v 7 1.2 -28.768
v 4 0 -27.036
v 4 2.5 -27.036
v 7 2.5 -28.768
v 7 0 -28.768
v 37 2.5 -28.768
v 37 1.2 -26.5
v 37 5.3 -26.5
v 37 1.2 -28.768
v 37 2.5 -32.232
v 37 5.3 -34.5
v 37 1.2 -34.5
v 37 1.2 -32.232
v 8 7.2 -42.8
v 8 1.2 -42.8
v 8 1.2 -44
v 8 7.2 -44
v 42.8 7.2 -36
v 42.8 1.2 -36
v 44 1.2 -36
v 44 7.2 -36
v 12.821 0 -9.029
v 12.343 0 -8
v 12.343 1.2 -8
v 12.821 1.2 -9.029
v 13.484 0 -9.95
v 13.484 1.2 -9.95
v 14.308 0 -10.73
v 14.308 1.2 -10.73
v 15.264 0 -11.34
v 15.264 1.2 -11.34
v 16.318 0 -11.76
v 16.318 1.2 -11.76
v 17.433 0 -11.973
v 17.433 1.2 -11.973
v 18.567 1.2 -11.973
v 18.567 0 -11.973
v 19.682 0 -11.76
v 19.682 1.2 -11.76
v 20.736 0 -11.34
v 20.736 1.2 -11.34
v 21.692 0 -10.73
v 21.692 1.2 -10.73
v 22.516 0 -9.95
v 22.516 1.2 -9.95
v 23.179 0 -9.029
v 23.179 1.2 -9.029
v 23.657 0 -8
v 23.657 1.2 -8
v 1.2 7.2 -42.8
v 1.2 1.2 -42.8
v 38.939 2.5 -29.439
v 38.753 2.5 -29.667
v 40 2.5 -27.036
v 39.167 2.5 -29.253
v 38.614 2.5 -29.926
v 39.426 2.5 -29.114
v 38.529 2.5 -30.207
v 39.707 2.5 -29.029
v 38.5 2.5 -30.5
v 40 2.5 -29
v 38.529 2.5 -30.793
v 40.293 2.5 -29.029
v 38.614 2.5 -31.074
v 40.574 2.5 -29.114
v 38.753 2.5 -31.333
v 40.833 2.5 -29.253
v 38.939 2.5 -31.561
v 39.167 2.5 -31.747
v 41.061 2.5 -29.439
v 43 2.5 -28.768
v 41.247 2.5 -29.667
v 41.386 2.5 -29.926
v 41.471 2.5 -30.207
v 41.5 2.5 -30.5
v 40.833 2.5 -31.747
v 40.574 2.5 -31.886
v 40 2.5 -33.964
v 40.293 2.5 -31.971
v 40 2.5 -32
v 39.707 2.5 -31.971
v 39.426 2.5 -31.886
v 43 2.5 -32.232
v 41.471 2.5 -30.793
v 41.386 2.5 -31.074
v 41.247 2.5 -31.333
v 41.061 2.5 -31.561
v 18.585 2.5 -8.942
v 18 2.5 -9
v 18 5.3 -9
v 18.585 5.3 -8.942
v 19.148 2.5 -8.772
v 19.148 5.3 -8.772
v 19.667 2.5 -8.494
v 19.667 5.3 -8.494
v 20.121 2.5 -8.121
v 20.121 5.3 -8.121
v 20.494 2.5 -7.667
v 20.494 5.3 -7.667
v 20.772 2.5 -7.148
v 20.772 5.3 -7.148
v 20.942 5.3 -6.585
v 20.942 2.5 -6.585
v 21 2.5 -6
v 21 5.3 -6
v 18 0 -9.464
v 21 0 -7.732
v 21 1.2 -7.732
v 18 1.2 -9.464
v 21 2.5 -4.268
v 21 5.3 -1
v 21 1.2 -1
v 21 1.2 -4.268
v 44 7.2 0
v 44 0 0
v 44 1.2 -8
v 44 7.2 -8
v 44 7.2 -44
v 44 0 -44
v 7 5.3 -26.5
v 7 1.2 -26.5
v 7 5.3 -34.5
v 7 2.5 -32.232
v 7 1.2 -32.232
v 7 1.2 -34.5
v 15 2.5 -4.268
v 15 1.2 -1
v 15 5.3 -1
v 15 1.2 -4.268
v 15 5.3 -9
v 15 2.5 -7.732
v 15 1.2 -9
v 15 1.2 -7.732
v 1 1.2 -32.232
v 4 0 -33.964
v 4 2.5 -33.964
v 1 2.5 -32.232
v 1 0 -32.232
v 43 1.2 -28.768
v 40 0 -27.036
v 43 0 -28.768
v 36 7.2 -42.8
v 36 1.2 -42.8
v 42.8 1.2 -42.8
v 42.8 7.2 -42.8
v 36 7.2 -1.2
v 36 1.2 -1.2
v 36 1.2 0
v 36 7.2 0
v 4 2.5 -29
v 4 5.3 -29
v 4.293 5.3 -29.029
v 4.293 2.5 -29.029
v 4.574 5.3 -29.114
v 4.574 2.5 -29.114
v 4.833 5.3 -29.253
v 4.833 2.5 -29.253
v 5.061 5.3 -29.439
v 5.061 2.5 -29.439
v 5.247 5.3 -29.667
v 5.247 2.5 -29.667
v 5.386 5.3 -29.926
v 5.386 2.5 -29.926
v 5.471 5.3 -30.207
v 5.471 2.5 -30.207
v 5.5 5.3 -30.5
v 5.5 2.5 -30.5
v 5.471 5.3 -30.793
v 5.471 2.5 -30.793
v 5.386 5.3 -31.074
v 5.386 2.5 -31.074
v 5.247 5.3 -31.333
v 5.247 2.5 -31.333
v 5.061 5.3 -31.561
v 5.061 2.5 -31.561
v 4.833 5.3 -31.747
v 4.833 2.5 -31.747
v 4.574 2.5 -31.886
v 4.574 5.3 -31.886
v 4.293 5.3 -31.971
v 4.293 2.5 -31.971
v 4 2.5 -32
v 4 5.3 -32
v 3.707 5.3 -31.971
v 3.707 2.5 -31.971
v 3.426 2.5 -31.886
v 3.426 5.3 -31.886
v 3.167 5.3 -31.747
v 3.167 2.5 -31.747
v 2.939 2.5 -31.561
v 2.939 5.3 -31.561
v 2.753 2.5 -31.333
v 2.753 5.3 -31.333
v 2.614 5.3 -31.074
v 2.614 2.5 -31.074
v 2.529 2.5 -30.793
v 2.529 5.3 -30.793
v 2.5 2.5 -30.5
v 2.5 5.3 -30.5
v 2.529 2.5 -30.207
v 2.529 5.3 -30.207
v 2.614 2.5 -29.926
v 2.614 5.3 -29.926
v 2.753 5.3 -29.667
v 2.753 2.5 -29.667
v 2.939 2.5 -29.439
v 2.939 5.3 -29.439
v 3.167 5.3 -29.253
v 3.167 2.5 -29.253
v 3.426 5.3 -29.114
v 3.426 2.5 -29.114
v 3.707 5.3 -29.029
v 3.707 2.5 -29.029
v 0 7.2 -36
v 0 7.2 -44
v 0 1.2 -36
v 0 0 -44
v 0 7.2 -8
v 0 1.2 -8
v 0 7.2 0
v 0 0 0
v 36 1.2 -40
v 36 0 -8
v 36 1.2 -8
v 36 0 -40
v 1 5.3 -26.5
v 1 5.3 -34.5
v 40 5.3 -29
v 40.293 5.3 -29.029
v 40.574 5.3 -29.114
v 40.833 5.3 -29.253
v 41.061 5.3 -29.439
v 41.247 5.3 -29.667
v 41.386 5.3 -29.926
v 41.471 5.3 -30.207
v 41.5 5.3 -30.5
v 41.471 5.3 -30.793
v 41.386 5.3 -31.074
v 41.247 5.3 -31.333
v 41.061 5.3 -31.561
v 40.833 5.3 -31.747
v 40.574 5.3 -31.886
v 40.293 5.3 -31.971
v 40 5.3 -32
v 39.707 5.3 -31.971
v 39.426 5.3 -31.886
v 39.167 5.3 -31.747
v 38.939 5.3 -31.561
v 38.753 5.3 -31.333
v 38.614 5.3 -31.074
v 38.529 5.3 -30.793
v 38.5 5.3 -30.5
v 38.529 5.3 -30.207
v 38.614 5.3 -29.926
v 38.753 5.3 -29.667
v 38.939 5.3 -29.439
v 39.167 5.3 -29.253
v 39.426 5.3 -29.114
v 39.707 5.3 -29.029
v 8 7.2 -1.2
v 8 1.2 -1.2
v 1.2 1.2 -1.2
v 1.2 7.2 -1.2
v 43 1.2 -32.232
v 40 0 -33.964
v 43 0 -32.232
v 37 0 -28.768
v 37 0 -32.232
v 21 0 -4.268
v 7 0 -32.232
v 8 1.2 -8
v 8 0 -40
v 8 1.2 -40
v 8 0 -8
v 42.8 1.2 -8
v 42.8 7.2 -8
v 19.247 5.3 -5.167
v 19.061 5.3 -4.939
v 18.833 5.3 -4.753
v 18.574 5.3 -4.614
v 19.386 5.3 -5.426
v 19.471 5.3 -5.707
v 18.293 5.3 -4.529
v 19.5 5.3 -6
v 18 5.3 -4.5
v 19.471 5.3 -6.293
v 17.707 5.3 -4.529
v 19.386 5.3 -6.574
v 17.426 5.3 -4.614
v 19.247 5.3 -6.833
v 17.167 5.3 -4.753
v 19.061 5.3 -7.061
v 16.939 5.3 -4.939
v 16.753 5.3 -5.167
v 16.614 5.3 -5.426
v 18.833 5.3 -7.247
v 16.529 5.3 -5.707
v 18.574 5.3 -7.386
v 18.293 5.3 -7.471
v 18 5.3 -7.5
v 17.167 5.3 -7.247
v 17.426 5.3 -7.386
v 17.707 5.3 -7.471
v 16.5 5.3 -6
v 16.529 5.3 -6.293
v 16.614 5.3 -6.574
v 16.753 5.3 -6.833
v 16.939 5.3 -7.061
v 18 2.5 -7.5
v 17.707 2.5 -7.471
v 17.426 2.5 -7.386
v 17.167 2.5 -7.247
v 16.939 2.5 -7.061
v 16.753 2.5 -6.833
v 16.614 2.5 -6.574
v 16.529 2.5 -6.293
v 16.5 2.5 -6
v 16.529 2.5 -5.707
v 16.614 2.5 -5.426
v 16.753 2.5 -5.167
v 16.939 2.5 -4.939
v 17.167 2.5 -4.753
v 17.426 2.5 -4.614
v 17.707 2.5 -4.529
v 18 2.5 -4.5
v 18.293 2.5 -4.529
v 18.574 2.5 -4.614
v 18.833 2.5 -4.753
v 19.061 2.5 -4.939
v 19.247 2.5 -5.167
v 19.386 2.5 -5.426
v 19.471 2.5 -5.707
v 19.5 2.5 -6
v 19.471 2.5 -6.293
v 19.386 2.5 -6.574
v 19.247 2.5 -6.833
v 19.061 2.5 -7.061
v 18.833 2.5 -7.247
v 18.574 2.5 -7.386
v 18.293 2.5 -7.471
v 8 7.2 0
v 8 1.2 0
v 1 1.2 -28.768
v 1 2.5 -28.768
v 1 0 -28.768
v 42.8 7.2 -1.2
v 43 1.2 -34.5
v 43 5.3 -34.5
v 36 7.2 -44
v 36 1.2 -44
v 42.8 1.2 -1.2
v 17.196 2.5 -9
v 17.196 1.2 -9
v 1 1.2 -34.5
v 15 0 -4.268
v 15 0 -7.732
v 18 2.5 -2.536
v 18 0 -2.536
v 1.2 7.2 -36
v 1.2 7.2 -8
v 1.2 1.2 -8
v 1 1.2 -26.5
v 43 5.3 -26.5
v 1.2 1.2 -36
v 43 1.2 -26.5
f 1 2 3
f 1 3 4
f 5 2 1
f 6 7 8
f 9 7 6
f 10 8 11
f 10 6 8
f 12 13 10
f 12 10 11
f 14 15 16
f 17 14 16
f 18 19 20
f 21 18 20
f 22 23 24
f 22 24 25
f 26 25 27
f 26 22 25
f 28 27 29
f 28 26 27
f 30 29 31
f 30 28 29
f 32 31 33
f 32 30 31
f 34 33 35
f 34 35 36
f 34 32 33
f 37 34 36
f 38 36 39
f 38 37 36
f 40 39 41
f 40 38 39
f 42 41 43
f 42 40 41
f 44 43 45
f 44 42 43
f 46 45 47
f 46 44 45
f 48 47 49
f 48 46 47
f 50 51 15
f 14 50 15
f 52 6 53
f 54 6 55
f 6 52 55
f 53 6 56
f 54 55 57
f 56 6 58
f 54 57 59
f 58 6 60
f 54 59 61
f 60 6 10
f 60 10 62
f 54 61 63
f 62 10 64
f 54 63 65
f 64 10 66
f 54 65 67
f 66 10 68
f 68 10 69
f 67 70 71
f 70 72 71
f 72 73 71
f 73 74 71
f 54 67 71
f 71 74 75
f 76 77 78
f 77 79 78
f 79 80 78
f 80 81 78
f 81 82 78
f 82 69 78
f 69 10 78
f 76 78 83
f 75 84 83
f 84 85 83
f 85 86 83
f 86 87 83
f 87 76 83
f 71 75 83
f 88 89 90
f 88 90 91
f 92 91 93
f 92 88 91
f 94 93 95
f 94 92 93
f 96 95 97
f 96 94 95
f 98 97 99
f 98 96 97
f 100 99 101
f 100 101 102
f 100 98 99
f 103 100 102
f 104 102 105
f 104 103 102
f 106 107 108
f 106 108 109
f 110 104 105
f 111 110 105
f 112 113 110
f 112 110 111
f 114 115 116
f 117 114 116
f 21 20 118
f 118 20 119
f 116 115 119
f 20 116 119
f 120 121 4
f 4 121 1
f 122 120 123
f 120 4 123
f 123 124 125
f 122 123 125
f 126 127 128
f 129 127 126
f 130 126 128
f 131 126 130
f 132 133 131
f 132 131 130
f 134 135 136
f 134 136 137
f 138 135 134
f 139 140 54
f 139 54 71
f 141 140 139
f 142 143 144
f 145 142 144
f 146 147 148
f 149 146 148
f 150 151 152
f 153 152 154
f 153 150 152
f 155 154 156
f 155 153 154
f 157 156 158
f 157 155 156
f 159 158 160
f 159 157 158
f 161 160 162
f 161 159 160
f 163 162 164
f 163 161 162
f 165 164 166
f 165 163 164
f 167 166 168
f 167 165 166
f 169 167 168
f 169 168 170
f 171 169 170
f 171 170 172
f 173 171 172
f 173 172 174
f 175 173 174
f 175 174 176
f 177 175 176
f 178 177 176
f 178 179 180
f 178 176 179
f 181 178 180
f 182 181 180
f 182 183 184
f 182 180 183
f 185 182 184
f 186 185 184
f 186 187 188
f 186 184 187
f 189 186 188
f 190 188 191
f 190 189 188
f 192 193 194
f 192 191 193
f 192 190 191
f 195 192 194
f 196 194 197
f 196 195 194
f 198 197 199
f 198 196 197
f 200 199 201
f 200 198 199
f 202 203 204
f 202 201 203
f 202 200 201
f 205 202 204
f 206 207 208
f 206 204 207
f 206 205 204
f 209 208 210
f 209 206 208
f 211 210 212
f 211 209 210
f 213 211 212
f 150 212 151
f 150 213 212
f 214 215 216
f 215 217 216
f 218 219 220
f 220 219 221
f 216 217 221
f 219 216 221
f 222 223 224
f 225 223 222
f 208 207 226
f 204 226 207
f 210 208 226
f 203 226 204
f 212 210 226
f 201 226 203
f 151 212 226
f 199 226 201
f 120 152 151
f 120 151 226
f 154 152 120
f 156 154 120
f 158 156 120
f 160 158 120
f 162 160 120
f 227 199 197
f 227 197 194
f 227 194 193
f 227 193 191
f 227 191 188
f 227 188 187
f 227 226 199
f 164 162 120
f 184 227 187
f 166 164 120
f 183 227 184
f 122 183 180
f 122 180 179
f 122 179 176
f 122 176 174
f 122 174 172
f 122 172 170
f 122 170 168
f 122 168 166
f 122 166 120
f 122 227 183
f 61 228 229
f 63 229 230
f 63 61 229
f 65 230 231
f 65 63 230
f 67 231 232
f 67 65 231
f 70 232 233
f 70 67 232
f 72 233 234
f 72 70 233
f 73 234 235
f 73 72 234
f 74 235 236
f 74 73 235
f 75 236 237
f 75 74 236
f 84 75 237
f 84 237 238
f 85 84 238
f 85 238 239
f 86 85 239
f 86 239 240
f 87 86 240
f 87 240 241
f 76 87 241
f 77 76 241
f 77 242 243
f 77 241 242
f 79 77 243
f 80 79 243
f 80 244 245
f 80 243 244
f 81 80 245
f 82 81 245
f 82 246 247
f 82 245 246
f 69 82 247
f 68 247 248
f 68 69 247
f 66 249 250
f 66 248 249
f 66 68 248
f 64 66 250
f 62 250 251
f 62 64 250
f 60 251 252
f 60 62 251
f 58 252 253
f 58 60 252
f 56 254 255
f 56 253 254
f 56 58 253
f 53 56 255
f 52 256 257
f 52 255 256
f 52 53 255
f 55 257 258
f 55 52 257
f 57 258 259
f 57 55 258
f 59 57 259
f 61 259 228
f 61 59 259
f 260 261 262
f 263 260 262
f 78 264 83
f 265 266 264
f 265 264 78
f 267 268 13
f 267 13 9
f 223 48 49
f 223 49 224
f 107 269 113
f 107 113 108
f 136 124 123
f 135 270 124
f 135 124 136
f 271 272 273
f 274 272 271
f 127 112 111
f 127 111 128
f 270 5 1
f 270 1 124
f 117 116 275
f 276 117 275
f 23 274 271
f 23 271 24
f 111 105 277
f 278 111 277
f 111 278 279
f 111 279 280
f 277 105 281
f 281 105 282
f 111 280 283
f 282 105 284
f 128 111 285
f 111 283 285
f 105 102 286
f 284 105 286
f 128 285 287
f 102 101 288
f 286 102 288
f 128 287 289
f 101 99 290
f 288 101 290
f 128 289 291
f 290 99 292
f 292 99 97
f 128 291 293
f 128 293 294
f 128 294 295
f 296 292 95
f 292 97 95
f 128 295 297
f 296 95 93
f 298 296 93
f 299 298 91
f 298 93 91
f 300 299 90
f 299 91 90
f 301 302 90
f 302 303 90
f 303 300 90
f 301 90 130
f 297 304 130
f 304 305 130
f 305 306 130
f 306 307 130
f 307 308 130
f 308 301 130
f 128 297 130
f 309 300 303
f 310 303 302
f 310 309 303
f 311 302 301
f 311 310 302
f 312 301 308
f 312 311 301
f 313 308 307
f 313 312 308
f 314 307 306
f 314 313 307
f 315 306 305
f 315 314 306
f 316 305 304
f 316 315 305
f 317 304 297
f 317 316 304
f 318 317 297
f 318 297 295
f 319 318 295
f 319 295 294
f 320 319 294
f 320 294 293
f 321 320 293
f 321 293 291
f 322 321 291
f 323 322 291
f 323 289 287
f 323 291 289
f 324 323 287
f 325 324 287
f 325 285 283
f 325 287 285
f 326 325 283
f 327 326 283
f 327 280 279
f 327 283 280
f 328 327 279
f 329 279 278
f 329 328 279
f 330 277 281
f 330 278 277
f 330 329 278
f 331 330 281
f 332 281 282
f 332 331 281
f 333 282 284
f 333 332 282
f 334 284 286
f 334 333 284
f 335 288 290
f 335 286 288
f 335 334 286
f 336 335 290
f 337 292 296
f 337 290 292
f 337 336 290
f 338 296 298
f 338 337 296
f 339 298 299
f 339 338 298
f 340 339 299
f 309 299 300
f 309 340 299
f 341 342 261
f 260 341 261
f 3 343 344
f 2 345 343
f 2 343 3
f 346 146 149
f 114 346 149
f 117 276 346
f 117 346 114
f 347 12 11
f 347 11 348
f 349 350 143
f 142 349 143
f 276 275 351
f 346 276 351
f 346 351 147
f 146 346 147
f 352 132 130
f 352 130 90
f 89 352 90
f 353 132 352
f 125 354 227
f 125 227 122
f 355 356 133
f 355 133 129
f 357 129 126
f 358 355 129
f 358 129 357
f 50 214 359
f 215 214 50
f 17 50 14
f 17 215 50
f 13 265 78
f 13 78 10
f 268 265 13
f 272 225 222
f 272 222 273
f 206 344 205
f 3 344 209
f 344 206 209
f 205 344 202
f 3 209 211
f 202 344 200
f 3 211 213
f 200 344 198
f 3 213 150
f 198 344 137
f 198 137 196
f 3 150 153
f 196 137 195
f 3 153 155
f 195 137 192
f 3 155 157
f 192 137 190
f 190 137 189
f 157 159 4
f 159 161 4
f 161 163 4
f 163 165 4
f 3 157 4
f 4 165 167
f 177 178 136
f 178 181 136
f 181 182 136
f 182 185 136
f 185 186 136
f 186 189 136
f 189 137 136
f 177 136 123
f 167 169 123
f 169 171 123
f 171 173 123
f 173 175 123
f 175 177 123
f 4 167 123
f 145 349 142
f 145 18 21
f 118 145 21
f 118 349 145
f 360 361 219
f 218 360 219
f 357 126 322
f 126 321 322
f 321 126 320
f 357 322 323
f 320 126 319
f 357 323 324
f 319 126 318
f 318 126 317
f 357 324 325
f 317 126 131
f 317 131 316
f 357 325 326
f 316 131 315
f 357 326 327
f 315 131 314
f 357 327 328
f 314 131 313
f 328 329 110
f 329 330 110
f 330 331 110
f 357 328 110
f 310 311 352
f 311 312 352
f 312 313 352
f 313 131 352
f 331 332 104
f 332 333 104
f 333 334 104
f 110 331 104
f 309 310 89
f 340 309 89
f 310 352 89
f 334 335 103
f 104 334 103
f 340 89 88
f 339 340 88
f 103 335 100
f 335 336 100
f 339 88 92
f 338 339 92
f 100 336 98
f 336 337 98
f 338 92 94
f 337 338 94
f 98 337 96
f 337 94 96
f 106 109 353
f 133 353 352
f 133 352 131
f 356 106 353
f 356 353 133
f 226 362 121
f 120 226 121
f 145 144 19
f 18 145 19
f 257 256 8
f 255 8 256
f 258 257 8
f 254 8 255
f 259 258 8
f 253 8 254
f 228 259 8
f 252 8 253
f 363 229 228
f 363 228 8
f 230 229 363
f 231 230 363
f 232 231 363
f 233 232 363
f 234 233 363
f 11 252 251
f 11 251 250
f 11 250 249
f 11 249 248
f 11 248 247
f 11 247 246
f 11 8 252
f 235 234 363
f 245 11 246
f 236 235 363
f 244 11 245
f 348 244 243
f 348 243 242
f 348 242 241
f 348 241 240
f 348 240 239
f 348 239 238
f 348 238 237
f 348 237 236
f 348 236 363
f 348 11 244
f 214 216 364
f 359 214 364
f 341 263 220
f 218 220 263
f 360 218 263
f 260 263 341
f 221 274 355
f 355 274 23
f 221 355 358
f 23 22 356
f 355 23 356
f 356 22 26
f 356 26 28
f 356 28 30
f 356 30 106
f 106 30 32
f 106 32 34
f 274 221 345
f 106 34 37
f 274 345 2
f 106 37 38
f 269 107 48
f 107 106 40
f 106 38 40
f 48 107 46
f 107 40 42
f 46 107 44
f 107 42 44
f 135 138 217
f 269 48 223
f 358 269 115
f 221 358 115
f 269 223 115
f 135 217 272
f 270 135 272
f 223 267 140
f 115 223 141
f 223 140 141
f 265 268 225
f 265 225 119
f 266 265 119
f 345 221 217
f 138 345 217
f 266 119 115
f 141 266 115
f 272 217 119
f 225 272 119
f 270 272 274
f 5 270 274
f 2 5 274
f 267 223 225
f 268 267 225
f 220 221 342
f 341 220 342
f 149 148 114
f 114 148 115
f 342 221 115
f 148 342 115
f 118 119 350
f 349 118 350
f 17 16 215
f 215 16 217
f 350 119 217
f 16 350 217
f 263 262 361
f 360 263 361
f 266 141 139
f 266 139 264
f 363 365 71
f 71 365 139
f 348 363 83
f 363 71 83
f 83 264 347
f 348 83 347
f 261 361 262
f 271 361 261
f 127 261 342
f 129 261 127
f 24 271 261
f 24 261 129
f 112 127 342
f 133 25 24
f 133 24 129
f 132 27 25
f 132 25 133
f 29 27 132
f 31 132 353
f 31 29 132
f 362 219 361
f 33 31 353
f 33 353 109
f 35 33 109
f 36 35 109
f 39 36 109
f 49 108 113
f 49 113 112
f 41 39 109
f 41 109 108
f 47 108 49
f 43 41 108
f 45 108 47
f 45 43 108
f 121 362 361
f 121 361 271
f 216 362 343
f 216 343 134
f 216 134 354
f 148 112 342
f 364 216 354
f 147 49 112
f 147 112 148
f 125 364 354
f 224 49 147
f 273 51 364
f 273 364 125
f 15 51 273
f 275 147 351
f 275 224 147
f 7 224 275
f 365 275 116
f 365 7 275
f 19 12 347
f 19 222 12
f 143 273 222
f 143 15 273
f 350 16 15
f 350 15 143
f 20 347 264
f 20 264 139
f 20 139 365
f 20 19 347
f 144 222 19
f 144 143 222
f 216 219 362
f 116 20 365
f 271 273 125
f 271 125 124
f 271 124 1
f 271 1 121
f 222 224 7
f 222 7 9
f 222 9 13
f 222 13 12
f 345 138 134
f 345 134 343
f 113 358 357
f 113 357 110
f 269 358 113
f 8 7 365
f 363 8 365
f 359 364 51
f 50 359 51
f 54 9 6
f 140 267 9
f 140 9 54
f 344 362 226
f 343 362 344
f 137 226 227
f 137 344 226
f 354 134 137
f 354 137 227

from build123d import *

# Parameters (mm, degrees)
SKETCH1_W           = 44
SKETCH1_H           = 44
SKETCH1_R           = 1.5
BOSS_EXTRUDE1_DEPTH = 1.2
BOSS_EXTRUDE4_DEPTH = 6
SKETCH5_W           = 6
SKETCH5_H           = 8
BOSS_EXTRUDE8_DEPTH = 4.1
SKETCH1_3_R         = 1.5
CUT_EXTRUDE1_DEPTH  = 2.5
SKETCH1_4_R         = 1.5
CUT_EXTRUDE2_DEPTH  = 63.640561939


with BuildPart() as part:
    # Sketch1 → Boss-Extrude1 (new body)
    with BuildSketch(Plane(origin=(0, 0, 0), x_dir=(1, 0, 0), z_dir=(0, 1, 0))):
        with Locations((22, 22)):
            Rectangle(SKETCH1_W, SKETCH1_H)
        with BuildLine():
            Line((36, 8), (23.656854249, 8))
            ThreePointArc((23.656854249, 8), (18, 12), (12.343145751, 8))
            Line((12.343145751, 8), (8, 8))
            Line((8, 8), (8, 40))
            Line((8, 40), (36, 40))
            Line((36, 40), (36, 8))
        make_face(mode=Mode.SUBTRACT)
        with Locations((18, 6)):
            Circle(SKETCH1_R, mode=Mode.SUBTRACT)
        with Locations((4, 30.5)):
            Circle(SKETCH1_R, mode=Mode.SUBTRACT)
        with Locations((40, 30.5)):
            Circle(SKETCH1_R, mode=Mode.SUBTRACT)
    extrude(amount=BOSS_EXTRUDE1_DEPTH)

    # Sketch4 → Boss-Extrude4 (add)
    with BuildSketch(Plane(origin=(0, 1.2, 0), x_dir=(1, 0, 0), z_dir=(0, 1, 0))):
        Polygon((8, 44), (0, 44), (0, 36), (1.2, 36), (1.2, 42.8), (8, 42.8), align=None)
        Polygon((44, 44), (36, 44), (36, 42.8), (42.8, 42.8), (42.8, 36), (44, 36), align=None)
        Polygon((1.2, 8), (0, 8), (0, 0), (8, 0), (8, 1.2), (1.2, 1.2), align=None)
        Polygon((44, 8), (42.8, 8), (42.8, 1.2), (36, 1.2), (36, 0), (44, 0), align=None)
    extrude(amount=BOSS_EXTRUDE4_DEPTH)

    # Sketch5 → Boss-Extrude8 (add)
    with BuildSketch(Plane(origin=(0, 1.2, 0), x_dir=(1, 0, 0), z_dir=(0, 1, 0))):
        with Locations((4, 30.5)):
            Rectangle(SKETCH5_W, SKETCH5_H)
        with Locations((40, 30.5)):
            Rectangle(SKETCH5_W, SKETCH5_H)
        with BuildLine():
            Line((15, 9), (18, 9))
            ThreePointArc((18, 9), (20.121320344, 8.121320344), (21, 6))
            Line((21, 6), (21, 1))
            Line((21, 1), (15, 1))
            Line((15, 1), (15, 9))
        make_face()
    extrude(amount=BOSS_EXTRUDE8_DEPTH)

    # Sketch1<3> → Cut-Extrude1 (cut)
    # profile 1 of 3: a face of its own
    with BuildSketch(Plane(origin=(0, 0, 0), x_dir=(1, 0, 0), z_dir=(0, 1, 0))):
        Polygon((4, 33.964101615), (1, 32.232050808), (1, 28.767949192), (4, 27.035898385), (7, 28.767949192), (7, 32.232050808), align=None)
        with Locations((4, 30.5)):
            Circle(SKETCH1_3_R, mode=Mode.SUBTRACT)
    # profile 2 of 3: a face of its own
    with BuildSketch(Plane(origin=(0, 0, 0), x_dir=(1, 0, 0), z_dir=(0, 1, 0))):
        Polygon((40, 33.964101615), (37, 32.232050808), (37, 28.767949192), (40, 27.035898385), (43, 28.767949192), (43, 32.232050808), align=None)
        with Locations((40, 30.5)):
            Circle(SKETCH1_3_R, mode=Mode.SUBTRACT)
    # profile 3 of 3: a face of its own
    with BuildSketch(Plane(origin=(0, 0, 0), x_dir=(1, 0, 0), z_dir=(0, 1, 0))):
        Polygon((18, 9.464101615), (15, 7.732050808), (15, 4.267949192), (18, 2.535898385), (21, 4.267949192), (21, 7.732050808), align=None)
        with Locations((18, 6)):
            Circle(SKETCH1_3_R, mode=Mode.SUBTRACT)
    extrude(amount=CUT_EXTRUDE1_DEPTH, mode=Mode.SUBTRACT)

    # Sketch1<4> → Cut-Extrude2 (cut, through all)
    with BuildSketch(Plane(origin=(0, 0, 0), x_dir=(1, 0, 0), z_dir=(0, 1, 0))):
        with Locations((4, 30.5)):
            Circle(SKETCH1_4_R)
        with Locations((40, 30.5)):
            Circle(SKETCH1_4_R)
        with Locations((18, 6)):
            Circle(SKETCH1_4_R)
    extrude(amount=CUT_EXTRUDE2_DEPTH, mode=Mode.SUBTRACT)


solid = part.part
